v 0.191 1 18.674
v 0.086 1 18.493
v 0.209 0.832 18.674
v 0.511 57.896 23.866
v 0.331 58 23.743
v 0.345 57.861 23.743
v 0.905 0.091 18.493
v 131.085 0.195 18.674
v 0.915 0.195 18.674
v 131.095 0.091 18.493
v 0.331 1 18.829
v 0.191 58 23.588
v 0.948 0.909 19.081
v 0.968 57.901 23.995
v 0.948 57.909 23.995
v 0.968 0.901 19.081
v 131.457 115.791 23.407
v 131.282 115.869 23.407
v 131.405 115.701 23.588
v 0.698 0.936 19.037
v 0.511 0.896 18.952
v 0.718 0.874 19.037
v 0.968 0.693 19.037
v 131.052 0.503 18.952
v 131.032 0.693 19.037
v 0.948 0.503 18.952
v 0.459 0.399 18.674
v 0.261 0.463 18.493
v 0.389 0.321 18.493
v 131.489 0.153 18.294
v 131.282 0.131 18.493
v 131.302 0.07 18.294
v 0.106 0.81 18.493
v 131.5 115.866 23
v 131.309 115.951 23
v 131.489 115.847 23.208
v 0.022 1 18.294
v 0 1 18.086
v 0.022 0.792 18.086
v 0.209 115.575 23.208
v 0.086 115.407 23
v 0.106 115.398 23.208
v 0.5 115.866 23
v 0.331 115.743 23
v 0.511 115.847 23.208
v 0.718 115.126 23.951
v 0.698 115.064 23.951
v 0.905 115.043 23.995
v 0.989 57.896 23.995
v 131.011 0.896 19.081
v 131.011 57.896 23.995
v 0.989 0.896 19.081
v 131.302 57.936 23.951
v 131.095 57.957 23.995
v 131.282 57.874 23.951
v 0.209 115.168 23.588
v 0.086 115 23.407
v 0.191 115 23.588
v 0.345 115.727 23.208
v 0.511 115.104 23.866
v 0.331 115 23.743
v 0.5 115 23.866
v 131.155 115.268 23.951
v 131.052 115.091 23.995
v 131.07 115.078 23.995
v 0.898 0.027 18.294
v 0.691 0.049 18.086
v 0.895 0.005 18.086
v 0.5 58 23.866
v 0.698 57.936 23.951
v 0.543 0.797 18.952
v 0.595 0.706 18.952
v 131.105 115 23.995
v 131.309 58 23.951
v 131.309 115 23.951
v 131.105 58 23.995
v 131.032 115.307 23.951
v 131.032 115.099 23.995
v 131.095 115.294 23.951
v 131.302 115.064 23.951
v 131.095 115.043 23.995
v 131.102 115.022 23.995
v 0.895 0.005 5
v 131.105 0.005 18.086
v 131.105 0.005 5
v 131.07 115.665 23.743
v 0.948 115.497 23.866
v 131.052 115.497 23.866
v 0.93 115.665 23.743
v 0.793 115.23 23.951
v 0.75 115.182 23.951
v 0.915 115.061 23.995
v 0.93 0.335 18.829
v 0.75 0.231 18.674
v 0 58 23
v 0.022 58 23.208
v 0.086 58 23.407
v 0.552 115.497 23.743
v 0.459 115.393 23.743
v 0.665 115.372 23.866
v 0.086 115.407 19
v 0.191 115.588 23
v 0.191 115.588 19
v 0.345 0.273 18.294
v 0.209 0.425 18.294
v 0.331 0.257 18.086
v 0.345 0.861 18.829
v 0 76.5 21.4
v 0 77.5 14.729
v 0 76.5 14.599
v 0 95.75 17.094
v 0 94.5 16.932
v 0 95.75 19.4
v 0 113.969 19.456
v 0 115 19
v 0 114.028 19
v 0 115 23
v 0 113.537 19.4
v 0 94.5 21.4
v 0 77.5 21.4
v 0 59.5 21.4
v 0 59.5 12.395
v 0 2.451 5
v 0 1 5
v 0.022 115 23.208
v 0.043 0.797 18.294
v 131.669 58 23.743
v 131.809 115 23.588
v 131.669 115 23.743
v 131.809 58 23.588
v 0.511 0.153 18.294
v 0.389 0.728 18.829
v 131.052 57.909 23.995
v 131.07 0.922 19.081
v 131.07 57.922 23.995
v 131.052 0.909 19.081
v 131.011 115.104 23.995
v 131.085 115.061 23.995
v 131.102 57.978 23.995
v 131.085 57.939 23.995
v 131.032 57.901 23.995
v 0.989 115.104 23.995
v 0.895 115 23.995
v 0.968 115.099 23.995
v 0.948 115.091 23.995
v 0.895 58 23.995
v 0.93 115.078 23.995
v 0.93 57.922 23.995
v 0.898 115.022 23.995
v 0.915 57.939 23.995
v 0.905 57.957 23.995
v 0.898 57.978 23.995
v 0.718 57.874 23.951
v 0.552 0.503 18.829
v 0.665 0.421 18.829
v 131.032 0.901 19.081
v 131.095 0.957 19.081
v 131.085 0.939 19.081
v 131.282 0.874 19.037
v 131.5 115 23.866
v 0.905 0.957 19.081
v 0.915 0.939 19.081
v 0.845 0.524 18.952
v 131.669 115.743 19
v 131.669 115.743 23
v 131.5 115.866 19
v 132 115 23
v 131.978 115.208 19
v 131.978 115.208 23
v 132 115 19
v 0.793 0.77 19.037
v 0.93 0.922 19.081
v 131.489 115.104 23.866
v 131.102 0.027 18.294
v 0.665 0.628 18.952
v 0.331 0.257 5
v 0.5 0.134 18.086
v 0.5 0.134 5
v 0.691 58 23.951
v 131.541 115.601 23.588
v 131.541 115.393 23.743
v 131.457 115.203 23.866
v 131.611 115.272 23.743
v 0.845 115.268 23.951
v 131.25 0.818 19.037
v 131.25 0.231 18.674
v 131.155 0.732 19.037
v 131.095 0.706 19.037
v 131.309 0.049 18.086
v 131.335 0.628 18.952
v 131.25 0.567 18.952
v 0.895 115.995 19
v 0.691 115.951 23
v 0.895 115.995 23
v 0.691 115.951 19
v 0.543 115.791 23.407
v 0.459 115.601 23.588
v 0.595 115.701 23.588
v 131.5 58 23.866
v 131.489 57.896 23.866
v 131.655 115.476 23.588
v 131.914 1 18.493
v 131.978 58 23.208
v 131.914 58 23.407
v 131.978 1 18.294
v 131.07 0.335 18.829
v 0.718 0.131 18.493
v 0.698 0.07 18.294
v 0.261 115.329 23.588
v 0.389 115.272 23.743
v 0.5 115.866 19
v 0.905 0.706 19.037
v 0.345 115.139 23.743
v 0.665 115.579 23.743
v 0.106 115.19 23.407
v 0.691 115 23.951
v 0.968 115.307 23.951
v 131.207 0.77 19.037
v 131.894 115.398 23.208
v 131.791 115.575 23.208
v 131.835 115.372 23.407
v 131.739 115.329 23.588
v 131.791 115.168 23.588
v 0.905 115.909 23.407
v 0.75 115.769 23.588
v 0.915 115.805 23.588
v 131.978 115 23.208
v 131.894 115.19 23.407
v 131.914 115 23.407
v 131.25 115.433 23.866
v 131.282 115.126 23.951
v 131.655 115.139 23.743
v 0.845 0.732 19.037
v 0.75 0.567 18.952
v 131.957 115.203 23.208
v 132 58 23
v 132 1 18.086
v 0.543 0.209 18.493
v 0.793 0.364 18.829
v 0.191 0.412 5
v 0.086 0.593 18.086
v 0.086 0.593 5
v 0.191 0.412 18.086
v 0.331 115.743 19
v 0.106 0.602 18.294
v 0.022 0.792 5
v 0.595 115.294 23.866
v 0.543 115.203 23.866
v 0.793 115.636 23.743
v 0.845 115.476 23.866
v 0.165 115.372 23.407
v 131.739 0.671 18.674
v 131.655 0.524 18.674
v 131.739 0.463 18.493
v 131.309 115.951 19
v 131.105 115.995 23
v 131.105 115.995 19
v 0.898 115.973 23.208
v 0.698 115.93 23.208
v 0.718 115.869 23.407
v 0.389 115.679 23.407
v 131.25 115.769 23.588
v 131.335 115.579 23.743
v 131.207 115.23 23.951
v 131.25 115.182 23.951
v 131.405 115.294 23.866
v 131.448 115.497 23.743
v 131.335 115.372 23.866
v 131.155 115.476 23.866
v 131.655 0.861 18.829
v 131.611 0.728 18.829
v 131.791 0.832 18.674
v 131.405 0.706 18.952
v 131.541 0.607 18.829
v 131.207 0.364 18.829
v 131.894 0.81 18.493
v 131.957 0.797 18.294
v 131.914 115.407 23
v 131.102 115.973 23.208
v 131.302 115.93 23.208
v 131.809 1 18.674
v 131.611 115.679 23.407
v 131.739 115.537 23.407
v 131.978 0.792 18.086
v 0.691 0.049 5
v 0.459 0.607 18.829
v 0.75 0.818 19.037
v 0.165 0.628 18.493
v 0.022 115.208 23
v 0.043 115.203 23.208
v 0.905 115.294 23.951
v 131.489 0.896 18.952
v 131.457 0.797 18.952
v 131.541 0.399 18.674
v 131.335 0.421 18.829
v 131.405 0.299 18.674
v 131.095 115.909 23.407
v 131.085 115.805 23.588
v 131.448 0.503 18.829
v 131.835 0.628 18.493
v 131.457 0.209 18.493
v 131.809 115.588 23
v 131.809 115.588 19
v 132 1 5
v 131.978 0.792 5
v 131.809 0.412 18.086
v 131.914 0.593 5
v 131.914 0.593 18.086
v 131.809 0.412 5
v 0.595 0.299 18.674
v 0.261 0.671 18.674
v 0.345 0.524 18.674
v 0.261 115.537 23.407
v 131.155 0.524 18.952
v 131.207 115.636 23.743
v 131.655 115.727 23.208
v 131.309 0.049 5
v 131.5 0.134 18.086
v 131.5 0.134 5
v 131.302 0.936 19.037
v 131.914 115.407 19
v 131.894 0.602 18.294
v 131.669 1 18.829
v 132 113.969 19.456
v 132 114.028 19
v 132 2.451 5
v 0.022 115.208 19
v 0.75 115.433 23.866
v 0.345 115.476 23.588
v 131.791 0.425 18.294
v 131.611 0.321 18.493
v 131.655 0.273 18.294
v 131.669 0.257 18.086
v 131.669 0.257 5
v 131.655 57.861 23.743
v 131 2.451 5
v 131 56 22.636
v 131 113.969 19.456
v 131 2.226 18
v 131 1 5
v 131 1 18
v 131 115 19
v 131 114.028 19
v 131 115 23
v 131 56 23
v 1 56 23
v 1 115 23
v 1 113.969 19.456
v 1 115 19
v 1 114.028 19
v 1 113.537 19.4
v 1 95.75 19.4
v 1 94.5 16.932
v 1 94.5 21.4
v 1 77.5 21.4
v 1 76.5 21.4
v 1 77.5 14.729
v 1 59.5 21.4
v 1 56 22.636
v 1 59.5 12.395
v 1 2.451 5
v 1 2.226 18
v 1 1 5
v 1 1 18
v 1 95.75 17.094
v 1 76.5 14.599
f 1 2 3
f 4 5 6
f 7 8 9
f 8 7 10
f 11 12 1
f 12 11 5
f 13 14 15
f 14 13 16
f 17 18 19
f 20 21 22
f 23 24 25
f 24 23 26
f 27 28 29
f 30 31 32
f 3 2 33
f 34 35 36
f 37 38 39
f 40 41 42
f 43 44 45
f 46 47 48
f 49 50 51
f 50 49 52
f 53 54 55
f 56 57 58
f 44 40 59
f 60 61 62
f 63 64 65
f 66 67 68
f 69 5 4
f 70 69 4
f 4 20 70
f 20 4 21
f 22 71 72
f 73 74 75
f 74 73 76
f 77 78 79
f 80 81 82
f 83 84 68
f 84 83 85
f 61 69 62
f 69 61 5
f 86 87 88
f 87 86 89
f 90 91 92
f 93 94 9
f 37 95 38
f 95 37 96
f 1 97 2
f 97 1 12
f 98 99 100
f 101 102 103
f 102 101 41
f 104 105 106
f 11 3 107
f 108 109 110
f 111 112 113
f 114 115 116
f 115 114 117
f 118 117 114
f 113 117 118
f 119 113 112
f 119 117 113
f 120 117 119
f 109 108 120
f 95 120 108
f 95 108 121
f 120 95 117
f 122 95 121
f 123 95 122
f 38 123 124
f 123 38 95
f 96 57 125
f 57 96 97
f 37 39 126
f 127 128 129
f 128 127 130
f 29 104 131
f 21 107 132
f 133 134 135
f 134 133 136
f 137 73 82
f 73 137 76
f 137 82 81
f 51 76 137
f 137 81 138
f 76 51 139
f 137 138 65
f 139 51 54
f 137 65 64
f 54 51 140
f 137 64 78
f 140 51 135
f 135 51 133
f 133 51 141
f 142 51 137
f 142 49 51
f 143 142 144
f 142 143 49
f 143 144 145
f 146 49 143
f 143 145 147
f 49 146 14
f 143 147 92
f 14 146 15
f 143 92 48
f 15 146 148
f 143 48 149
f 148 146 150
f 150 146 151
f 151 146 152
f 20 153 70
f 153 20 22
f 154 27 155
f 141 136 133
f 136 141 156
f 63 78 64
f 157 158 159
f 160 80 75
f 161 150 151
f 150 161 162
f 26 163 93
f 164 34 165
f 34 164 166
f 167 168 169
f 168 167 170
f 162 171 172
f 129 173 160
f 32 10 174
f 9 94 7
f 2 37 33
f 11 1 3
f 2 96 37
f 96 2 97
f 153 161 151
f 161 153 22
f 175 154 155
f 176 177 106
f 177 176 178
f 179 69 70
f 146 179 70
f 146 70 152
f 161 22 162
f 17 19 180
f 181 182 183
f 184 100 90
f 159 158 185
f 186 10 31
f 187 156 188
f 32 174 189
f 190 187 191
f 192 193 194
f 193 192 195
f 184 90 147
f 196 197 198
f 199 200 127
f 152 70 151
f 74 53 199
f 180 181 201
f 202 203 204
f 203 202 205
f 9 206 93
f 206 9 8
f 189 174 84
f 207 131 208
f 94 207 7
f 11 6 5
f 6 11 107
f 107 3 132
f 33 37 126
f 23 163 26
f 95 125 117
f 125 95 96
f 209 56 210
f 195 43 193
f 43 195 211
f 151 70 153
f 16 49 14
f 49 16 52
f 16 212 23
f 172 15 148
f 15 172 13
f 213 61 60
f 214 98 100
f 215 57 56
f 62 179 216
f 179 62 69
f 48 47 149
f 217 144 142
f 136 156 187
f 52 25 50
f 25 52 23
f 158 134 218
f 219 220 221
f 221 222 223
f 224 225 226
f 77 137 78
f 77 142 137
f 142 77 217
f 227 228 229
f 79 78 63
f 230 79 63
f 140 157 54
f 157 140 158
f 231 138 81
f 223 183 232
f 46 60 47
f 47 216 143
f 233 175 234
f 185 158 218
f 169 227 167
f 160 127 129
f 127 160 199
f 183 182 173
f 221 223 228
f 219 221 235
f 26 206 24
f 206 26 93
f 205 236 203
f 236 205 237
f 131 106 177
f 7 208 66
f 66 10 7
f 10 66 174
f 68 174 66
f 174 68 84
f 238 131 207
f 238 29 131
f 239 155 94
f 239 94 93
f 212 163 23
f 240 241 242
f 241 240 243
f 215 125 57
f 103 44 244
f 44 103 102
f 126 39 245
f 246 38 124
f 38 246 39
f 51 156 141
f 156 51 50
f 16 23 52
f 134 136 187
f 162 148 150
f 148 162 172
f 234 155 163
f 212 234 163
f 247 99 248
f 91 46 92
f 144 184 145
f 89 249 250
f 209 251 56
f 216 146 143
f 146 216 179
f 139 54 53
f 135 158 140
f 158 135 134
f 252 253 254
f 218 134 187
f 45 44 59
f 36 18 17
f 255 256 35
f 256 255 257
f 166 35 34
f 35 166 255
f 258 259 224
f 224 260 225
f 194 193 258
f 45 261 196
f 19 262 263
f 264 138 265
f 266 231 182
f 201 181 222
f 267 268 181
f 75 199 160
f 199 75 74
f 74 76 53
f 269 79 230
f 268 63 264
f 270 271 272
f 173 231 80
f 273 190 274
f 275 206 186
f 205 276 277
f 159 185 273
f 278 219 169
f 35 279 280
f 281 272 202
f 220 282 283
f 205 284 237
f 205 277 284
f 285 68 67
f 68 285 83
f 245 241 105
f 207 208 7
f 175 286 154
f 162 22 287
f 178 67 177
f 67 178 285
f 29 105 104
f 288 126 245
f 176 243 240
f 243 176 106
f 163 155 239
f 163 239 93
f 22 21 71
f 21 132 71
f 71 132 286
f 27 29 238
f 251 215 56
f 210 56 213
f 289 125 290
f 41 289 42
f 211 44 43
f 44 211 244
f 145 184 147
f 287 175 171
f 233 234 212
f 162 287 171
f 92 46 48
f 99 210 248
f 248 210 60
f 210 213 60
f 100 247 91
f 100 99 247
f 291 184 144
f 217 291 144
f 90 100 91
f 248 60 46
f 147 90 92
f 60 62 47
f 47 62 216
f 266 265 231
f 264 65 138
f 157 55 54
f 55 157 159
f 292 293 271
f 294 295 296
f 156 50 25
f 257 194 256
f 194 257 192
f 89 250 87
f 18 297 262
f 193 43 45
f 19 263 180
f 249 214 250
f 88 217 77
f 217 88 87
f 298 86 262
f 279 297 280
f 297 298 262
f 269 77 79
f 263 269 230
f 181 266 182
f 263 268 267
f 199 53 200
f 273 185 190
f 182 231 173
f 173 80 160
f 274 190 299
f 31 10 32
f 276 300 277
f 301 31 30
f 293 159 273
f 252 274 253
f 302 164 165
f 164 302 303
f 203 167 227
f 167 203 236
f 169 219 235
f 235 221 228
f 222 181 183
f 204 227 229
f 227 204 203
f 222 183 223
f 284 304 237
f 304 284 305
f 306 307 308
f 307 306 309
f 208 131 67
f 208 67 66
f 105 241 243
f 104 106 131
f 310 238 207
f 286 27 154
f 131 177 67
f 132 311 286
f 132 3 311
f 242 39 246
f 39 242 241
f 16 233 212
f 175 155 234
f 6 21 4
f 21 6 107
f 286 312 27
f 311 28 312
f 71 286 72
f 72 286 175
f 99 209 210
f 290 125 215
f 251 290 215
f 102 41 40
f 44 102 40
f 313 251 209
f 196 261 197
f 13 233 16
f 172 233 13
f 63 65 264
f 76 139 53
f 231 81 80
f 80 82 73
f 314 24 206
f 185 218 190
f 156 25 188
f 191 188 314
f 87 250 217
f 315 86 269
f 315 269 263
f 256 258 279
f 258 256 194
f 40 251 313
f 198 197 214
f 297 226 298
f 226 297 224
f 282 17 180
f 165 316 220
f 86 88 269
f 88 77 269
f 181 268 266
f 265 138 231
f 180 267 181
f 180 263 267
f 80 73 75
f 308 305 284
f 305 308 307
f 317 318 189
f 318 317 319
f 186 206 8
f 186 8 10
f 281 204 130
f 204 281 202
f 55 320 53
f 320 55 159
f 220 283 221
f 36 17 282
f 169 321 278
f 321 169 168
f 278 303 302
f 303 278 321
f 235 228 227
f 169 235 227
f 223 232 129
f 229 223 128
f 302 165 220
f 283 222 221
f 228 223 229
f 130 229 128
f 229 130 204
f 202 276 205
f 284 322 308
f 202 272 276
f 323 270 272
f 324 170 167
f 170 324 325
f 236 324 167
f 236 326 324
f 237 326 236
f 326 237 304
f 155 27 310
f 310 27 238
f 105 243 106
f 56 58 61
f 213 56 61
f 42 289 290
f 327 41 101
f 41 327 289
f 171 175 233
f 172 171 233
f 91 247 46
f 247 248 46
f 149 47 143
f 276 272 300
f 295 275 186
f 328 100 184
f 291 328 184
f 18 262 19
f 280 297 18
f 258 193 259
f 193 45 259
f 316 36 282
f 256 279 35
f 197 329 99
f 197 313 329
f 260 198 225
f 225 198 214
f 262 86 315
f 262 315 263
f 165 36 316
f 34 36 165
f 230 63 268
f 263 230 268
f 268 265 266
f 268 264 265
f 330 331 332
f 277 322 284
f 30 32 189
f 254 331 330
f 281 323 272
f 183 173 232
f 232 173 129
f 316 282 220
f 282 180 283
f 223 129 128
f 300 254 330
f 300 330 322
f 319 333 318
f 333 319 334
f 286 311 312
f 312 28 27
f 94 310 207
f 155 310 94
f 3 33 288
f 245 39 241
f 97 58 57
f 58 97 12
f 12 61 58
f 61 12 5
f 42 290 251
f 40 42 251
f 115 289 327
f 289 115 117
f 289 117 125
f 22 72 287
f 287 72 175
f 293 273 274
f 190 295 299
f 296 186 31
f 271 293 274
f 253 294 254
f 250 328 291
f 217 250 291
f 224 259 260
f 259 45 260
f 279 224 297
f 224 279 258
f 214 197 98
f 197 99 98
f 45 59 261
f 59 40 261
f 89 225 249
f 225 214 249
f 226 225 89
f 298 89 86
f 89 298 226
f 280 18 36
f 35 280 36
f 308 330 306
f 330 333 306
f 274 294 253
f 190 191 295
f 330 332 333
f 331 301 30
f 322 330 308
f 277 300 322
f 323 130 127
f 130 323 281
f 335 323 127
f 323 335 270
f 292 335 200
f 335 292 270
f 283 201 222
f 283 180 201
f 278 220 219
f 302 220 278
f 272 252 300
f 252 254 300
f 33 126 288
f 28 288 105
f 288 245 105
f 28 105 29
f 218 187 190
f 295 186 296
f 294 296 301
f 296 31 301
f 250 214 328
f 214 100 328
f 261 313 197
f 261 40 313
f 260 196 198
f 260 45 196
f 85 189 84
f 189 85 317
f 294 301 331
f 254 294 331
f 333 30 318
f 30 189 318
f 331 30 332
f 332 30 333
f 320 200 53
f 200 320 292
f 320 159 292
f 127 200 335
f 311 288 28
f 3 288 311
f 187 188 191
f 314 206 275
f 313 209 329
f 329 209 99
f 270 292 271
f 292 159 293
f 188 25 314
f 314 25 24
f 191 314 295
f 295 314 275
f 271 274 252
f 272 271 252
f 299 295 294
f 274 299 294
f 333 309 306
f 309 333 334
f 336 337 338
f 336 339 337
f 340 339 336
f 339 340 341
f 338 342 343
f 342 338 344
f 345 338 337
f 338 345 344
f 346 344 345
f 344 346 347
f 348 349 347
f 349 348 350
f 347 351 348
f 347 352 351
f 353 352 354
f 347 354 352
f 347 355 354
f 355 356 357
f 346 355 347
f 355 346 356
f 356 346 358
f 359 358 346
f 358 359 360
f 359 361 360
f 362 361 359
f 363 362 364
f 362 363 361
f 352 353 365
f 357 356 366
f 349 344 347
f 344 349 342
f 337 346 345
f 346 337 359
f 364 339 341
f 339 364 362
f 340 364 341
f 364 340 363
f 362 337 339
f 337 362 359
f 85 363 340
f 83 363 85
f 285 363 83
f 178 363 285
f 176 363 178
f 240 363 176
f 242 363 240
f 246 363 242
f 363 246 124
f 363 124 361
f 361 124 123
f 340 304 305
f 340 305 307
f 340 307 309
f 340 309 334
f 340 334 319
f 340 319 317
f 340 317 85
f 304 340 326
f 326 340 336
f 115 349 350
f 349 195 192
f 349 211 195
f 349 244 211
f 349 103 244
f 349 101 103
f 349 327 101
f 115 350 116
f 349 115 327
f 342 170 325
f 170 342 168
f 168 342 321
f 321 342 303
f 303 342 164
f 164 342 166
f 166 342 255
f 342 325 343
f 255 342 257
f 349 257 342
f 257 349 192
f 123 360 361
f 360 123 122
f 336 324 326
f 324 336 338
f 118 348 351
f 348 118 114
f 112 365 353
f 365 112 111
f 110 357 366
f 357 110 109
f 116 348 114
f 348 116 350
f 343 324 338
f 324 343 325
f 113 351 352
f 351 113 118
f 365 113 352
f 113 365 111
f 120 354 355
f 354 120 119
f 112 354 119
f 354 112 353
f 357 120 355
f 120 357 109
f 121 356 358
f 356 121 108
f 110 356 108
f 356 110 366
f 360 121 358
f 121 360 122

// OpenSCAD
// file: params.scad
depth = 116;
width = 132;
height = 24;
edge = 5;
edge_inset=4;
wall = 1;


pi_width=85;
pi_depth=56;
pi_mount_offset=3.5;
pi_mount_width_apart=58;
pi_mount_depth_apart=49;

side_angle=atan((height-edge*2)/(depth-(edge_inset*2)));
top_angle=atan(edge/(depth-wall-wall-pi_depth)); // 3.81
mount_stand_r=2.5;
mount_stand_h=3;
mount_rod=1.2;



pcb_height=1.4;

ethernet_port_width=18;
ethernet_port_depth=20;
ethernet_port_height=14;
ethernet_port_offset=10.25;

usb_port_width=17;
usb_port_depth=20;
usb_port_height=16;
usb_port_a_offset=29;
usb_port_b_offset=47;

audio_port_depth=20;
audio_port_r=4;
audio_port_offset=53.5;

hdmi_width=17;
hdmi_height=7;
hdmi_depth=20;
hdmi_offset=32;

micro_usb_port_depth=20;
micro_usb_port_width=9;
micro_usb_port_height=3;
micro_usb_port_offset=10.6;
// main file
include<params.scad>;

$fn=30;

module base() {
	difference() {
		// Outer shell
		minkowski() {
			difference() {
				translate([wall, wall, wall]) cube([width-(2*wall), depth-(2*wall), height-(2*wall)]);
				translate([-1, 0, height-edge-wall]) 	
					rotate([top_angle,0,0]) 
							cube([width+(wall*2), pi_depth*2, edge]);
			}			
			sphere(1);
		}
		
		// Center cut out
		translate([wall, depth-pi_depth-4, 0]) 
			cube([width-(2*wall), pi_depth-wall+4, height-wall]); 

		// Center cut out
		translate([wall, wall, 0]) 
			cube([width-(2*wall), edge, height-edge-wall]); 

		translate([wall, wall*3, 0]) 
			rotate([top_angle,0,0]) 
				cube([width-(2*wall), pi_depth-wall, height-edge-wall]); 

		// Front cut out
		translate([-1,-1,-1]) 
			cube([width+(wall*2), edge_inset+1, edge+1]);

		// Back cut out
		translate([-1, depth-edge_inset , -1]) 
			cube([width+wall*2, wall*5, height-edge+1]);

		// Diagonal edges
		translate([-1, edge_inset, -(height-edge)]) 	
			rotate([side_angle,0,0]) 
				cube([width+(wall*2), depth-(wall*2), height]);




	}
}



module etherent_port() {
	translate([-1, depth-wall-ethernet_port_offset-(ethernet_port_width/2), wall+mount_stand_h+pcb_height]) 
		cube([ethernet_port_depth, ethernet_port_width, ethernet_port_height]);
}

module usb_port(offset) {
	translate([-1, depth-wall-offset-(usb_port_width/2), wall+mount_stand_h+pcb_height]) 
		cube([usb_port_depth, usb_port_width, usb_port_height]); 
}

difference() {
	base();
	etherent_port();
	usb_port(usb_port_a_offset);
	usb_port(usb_port_b_offset);
}
